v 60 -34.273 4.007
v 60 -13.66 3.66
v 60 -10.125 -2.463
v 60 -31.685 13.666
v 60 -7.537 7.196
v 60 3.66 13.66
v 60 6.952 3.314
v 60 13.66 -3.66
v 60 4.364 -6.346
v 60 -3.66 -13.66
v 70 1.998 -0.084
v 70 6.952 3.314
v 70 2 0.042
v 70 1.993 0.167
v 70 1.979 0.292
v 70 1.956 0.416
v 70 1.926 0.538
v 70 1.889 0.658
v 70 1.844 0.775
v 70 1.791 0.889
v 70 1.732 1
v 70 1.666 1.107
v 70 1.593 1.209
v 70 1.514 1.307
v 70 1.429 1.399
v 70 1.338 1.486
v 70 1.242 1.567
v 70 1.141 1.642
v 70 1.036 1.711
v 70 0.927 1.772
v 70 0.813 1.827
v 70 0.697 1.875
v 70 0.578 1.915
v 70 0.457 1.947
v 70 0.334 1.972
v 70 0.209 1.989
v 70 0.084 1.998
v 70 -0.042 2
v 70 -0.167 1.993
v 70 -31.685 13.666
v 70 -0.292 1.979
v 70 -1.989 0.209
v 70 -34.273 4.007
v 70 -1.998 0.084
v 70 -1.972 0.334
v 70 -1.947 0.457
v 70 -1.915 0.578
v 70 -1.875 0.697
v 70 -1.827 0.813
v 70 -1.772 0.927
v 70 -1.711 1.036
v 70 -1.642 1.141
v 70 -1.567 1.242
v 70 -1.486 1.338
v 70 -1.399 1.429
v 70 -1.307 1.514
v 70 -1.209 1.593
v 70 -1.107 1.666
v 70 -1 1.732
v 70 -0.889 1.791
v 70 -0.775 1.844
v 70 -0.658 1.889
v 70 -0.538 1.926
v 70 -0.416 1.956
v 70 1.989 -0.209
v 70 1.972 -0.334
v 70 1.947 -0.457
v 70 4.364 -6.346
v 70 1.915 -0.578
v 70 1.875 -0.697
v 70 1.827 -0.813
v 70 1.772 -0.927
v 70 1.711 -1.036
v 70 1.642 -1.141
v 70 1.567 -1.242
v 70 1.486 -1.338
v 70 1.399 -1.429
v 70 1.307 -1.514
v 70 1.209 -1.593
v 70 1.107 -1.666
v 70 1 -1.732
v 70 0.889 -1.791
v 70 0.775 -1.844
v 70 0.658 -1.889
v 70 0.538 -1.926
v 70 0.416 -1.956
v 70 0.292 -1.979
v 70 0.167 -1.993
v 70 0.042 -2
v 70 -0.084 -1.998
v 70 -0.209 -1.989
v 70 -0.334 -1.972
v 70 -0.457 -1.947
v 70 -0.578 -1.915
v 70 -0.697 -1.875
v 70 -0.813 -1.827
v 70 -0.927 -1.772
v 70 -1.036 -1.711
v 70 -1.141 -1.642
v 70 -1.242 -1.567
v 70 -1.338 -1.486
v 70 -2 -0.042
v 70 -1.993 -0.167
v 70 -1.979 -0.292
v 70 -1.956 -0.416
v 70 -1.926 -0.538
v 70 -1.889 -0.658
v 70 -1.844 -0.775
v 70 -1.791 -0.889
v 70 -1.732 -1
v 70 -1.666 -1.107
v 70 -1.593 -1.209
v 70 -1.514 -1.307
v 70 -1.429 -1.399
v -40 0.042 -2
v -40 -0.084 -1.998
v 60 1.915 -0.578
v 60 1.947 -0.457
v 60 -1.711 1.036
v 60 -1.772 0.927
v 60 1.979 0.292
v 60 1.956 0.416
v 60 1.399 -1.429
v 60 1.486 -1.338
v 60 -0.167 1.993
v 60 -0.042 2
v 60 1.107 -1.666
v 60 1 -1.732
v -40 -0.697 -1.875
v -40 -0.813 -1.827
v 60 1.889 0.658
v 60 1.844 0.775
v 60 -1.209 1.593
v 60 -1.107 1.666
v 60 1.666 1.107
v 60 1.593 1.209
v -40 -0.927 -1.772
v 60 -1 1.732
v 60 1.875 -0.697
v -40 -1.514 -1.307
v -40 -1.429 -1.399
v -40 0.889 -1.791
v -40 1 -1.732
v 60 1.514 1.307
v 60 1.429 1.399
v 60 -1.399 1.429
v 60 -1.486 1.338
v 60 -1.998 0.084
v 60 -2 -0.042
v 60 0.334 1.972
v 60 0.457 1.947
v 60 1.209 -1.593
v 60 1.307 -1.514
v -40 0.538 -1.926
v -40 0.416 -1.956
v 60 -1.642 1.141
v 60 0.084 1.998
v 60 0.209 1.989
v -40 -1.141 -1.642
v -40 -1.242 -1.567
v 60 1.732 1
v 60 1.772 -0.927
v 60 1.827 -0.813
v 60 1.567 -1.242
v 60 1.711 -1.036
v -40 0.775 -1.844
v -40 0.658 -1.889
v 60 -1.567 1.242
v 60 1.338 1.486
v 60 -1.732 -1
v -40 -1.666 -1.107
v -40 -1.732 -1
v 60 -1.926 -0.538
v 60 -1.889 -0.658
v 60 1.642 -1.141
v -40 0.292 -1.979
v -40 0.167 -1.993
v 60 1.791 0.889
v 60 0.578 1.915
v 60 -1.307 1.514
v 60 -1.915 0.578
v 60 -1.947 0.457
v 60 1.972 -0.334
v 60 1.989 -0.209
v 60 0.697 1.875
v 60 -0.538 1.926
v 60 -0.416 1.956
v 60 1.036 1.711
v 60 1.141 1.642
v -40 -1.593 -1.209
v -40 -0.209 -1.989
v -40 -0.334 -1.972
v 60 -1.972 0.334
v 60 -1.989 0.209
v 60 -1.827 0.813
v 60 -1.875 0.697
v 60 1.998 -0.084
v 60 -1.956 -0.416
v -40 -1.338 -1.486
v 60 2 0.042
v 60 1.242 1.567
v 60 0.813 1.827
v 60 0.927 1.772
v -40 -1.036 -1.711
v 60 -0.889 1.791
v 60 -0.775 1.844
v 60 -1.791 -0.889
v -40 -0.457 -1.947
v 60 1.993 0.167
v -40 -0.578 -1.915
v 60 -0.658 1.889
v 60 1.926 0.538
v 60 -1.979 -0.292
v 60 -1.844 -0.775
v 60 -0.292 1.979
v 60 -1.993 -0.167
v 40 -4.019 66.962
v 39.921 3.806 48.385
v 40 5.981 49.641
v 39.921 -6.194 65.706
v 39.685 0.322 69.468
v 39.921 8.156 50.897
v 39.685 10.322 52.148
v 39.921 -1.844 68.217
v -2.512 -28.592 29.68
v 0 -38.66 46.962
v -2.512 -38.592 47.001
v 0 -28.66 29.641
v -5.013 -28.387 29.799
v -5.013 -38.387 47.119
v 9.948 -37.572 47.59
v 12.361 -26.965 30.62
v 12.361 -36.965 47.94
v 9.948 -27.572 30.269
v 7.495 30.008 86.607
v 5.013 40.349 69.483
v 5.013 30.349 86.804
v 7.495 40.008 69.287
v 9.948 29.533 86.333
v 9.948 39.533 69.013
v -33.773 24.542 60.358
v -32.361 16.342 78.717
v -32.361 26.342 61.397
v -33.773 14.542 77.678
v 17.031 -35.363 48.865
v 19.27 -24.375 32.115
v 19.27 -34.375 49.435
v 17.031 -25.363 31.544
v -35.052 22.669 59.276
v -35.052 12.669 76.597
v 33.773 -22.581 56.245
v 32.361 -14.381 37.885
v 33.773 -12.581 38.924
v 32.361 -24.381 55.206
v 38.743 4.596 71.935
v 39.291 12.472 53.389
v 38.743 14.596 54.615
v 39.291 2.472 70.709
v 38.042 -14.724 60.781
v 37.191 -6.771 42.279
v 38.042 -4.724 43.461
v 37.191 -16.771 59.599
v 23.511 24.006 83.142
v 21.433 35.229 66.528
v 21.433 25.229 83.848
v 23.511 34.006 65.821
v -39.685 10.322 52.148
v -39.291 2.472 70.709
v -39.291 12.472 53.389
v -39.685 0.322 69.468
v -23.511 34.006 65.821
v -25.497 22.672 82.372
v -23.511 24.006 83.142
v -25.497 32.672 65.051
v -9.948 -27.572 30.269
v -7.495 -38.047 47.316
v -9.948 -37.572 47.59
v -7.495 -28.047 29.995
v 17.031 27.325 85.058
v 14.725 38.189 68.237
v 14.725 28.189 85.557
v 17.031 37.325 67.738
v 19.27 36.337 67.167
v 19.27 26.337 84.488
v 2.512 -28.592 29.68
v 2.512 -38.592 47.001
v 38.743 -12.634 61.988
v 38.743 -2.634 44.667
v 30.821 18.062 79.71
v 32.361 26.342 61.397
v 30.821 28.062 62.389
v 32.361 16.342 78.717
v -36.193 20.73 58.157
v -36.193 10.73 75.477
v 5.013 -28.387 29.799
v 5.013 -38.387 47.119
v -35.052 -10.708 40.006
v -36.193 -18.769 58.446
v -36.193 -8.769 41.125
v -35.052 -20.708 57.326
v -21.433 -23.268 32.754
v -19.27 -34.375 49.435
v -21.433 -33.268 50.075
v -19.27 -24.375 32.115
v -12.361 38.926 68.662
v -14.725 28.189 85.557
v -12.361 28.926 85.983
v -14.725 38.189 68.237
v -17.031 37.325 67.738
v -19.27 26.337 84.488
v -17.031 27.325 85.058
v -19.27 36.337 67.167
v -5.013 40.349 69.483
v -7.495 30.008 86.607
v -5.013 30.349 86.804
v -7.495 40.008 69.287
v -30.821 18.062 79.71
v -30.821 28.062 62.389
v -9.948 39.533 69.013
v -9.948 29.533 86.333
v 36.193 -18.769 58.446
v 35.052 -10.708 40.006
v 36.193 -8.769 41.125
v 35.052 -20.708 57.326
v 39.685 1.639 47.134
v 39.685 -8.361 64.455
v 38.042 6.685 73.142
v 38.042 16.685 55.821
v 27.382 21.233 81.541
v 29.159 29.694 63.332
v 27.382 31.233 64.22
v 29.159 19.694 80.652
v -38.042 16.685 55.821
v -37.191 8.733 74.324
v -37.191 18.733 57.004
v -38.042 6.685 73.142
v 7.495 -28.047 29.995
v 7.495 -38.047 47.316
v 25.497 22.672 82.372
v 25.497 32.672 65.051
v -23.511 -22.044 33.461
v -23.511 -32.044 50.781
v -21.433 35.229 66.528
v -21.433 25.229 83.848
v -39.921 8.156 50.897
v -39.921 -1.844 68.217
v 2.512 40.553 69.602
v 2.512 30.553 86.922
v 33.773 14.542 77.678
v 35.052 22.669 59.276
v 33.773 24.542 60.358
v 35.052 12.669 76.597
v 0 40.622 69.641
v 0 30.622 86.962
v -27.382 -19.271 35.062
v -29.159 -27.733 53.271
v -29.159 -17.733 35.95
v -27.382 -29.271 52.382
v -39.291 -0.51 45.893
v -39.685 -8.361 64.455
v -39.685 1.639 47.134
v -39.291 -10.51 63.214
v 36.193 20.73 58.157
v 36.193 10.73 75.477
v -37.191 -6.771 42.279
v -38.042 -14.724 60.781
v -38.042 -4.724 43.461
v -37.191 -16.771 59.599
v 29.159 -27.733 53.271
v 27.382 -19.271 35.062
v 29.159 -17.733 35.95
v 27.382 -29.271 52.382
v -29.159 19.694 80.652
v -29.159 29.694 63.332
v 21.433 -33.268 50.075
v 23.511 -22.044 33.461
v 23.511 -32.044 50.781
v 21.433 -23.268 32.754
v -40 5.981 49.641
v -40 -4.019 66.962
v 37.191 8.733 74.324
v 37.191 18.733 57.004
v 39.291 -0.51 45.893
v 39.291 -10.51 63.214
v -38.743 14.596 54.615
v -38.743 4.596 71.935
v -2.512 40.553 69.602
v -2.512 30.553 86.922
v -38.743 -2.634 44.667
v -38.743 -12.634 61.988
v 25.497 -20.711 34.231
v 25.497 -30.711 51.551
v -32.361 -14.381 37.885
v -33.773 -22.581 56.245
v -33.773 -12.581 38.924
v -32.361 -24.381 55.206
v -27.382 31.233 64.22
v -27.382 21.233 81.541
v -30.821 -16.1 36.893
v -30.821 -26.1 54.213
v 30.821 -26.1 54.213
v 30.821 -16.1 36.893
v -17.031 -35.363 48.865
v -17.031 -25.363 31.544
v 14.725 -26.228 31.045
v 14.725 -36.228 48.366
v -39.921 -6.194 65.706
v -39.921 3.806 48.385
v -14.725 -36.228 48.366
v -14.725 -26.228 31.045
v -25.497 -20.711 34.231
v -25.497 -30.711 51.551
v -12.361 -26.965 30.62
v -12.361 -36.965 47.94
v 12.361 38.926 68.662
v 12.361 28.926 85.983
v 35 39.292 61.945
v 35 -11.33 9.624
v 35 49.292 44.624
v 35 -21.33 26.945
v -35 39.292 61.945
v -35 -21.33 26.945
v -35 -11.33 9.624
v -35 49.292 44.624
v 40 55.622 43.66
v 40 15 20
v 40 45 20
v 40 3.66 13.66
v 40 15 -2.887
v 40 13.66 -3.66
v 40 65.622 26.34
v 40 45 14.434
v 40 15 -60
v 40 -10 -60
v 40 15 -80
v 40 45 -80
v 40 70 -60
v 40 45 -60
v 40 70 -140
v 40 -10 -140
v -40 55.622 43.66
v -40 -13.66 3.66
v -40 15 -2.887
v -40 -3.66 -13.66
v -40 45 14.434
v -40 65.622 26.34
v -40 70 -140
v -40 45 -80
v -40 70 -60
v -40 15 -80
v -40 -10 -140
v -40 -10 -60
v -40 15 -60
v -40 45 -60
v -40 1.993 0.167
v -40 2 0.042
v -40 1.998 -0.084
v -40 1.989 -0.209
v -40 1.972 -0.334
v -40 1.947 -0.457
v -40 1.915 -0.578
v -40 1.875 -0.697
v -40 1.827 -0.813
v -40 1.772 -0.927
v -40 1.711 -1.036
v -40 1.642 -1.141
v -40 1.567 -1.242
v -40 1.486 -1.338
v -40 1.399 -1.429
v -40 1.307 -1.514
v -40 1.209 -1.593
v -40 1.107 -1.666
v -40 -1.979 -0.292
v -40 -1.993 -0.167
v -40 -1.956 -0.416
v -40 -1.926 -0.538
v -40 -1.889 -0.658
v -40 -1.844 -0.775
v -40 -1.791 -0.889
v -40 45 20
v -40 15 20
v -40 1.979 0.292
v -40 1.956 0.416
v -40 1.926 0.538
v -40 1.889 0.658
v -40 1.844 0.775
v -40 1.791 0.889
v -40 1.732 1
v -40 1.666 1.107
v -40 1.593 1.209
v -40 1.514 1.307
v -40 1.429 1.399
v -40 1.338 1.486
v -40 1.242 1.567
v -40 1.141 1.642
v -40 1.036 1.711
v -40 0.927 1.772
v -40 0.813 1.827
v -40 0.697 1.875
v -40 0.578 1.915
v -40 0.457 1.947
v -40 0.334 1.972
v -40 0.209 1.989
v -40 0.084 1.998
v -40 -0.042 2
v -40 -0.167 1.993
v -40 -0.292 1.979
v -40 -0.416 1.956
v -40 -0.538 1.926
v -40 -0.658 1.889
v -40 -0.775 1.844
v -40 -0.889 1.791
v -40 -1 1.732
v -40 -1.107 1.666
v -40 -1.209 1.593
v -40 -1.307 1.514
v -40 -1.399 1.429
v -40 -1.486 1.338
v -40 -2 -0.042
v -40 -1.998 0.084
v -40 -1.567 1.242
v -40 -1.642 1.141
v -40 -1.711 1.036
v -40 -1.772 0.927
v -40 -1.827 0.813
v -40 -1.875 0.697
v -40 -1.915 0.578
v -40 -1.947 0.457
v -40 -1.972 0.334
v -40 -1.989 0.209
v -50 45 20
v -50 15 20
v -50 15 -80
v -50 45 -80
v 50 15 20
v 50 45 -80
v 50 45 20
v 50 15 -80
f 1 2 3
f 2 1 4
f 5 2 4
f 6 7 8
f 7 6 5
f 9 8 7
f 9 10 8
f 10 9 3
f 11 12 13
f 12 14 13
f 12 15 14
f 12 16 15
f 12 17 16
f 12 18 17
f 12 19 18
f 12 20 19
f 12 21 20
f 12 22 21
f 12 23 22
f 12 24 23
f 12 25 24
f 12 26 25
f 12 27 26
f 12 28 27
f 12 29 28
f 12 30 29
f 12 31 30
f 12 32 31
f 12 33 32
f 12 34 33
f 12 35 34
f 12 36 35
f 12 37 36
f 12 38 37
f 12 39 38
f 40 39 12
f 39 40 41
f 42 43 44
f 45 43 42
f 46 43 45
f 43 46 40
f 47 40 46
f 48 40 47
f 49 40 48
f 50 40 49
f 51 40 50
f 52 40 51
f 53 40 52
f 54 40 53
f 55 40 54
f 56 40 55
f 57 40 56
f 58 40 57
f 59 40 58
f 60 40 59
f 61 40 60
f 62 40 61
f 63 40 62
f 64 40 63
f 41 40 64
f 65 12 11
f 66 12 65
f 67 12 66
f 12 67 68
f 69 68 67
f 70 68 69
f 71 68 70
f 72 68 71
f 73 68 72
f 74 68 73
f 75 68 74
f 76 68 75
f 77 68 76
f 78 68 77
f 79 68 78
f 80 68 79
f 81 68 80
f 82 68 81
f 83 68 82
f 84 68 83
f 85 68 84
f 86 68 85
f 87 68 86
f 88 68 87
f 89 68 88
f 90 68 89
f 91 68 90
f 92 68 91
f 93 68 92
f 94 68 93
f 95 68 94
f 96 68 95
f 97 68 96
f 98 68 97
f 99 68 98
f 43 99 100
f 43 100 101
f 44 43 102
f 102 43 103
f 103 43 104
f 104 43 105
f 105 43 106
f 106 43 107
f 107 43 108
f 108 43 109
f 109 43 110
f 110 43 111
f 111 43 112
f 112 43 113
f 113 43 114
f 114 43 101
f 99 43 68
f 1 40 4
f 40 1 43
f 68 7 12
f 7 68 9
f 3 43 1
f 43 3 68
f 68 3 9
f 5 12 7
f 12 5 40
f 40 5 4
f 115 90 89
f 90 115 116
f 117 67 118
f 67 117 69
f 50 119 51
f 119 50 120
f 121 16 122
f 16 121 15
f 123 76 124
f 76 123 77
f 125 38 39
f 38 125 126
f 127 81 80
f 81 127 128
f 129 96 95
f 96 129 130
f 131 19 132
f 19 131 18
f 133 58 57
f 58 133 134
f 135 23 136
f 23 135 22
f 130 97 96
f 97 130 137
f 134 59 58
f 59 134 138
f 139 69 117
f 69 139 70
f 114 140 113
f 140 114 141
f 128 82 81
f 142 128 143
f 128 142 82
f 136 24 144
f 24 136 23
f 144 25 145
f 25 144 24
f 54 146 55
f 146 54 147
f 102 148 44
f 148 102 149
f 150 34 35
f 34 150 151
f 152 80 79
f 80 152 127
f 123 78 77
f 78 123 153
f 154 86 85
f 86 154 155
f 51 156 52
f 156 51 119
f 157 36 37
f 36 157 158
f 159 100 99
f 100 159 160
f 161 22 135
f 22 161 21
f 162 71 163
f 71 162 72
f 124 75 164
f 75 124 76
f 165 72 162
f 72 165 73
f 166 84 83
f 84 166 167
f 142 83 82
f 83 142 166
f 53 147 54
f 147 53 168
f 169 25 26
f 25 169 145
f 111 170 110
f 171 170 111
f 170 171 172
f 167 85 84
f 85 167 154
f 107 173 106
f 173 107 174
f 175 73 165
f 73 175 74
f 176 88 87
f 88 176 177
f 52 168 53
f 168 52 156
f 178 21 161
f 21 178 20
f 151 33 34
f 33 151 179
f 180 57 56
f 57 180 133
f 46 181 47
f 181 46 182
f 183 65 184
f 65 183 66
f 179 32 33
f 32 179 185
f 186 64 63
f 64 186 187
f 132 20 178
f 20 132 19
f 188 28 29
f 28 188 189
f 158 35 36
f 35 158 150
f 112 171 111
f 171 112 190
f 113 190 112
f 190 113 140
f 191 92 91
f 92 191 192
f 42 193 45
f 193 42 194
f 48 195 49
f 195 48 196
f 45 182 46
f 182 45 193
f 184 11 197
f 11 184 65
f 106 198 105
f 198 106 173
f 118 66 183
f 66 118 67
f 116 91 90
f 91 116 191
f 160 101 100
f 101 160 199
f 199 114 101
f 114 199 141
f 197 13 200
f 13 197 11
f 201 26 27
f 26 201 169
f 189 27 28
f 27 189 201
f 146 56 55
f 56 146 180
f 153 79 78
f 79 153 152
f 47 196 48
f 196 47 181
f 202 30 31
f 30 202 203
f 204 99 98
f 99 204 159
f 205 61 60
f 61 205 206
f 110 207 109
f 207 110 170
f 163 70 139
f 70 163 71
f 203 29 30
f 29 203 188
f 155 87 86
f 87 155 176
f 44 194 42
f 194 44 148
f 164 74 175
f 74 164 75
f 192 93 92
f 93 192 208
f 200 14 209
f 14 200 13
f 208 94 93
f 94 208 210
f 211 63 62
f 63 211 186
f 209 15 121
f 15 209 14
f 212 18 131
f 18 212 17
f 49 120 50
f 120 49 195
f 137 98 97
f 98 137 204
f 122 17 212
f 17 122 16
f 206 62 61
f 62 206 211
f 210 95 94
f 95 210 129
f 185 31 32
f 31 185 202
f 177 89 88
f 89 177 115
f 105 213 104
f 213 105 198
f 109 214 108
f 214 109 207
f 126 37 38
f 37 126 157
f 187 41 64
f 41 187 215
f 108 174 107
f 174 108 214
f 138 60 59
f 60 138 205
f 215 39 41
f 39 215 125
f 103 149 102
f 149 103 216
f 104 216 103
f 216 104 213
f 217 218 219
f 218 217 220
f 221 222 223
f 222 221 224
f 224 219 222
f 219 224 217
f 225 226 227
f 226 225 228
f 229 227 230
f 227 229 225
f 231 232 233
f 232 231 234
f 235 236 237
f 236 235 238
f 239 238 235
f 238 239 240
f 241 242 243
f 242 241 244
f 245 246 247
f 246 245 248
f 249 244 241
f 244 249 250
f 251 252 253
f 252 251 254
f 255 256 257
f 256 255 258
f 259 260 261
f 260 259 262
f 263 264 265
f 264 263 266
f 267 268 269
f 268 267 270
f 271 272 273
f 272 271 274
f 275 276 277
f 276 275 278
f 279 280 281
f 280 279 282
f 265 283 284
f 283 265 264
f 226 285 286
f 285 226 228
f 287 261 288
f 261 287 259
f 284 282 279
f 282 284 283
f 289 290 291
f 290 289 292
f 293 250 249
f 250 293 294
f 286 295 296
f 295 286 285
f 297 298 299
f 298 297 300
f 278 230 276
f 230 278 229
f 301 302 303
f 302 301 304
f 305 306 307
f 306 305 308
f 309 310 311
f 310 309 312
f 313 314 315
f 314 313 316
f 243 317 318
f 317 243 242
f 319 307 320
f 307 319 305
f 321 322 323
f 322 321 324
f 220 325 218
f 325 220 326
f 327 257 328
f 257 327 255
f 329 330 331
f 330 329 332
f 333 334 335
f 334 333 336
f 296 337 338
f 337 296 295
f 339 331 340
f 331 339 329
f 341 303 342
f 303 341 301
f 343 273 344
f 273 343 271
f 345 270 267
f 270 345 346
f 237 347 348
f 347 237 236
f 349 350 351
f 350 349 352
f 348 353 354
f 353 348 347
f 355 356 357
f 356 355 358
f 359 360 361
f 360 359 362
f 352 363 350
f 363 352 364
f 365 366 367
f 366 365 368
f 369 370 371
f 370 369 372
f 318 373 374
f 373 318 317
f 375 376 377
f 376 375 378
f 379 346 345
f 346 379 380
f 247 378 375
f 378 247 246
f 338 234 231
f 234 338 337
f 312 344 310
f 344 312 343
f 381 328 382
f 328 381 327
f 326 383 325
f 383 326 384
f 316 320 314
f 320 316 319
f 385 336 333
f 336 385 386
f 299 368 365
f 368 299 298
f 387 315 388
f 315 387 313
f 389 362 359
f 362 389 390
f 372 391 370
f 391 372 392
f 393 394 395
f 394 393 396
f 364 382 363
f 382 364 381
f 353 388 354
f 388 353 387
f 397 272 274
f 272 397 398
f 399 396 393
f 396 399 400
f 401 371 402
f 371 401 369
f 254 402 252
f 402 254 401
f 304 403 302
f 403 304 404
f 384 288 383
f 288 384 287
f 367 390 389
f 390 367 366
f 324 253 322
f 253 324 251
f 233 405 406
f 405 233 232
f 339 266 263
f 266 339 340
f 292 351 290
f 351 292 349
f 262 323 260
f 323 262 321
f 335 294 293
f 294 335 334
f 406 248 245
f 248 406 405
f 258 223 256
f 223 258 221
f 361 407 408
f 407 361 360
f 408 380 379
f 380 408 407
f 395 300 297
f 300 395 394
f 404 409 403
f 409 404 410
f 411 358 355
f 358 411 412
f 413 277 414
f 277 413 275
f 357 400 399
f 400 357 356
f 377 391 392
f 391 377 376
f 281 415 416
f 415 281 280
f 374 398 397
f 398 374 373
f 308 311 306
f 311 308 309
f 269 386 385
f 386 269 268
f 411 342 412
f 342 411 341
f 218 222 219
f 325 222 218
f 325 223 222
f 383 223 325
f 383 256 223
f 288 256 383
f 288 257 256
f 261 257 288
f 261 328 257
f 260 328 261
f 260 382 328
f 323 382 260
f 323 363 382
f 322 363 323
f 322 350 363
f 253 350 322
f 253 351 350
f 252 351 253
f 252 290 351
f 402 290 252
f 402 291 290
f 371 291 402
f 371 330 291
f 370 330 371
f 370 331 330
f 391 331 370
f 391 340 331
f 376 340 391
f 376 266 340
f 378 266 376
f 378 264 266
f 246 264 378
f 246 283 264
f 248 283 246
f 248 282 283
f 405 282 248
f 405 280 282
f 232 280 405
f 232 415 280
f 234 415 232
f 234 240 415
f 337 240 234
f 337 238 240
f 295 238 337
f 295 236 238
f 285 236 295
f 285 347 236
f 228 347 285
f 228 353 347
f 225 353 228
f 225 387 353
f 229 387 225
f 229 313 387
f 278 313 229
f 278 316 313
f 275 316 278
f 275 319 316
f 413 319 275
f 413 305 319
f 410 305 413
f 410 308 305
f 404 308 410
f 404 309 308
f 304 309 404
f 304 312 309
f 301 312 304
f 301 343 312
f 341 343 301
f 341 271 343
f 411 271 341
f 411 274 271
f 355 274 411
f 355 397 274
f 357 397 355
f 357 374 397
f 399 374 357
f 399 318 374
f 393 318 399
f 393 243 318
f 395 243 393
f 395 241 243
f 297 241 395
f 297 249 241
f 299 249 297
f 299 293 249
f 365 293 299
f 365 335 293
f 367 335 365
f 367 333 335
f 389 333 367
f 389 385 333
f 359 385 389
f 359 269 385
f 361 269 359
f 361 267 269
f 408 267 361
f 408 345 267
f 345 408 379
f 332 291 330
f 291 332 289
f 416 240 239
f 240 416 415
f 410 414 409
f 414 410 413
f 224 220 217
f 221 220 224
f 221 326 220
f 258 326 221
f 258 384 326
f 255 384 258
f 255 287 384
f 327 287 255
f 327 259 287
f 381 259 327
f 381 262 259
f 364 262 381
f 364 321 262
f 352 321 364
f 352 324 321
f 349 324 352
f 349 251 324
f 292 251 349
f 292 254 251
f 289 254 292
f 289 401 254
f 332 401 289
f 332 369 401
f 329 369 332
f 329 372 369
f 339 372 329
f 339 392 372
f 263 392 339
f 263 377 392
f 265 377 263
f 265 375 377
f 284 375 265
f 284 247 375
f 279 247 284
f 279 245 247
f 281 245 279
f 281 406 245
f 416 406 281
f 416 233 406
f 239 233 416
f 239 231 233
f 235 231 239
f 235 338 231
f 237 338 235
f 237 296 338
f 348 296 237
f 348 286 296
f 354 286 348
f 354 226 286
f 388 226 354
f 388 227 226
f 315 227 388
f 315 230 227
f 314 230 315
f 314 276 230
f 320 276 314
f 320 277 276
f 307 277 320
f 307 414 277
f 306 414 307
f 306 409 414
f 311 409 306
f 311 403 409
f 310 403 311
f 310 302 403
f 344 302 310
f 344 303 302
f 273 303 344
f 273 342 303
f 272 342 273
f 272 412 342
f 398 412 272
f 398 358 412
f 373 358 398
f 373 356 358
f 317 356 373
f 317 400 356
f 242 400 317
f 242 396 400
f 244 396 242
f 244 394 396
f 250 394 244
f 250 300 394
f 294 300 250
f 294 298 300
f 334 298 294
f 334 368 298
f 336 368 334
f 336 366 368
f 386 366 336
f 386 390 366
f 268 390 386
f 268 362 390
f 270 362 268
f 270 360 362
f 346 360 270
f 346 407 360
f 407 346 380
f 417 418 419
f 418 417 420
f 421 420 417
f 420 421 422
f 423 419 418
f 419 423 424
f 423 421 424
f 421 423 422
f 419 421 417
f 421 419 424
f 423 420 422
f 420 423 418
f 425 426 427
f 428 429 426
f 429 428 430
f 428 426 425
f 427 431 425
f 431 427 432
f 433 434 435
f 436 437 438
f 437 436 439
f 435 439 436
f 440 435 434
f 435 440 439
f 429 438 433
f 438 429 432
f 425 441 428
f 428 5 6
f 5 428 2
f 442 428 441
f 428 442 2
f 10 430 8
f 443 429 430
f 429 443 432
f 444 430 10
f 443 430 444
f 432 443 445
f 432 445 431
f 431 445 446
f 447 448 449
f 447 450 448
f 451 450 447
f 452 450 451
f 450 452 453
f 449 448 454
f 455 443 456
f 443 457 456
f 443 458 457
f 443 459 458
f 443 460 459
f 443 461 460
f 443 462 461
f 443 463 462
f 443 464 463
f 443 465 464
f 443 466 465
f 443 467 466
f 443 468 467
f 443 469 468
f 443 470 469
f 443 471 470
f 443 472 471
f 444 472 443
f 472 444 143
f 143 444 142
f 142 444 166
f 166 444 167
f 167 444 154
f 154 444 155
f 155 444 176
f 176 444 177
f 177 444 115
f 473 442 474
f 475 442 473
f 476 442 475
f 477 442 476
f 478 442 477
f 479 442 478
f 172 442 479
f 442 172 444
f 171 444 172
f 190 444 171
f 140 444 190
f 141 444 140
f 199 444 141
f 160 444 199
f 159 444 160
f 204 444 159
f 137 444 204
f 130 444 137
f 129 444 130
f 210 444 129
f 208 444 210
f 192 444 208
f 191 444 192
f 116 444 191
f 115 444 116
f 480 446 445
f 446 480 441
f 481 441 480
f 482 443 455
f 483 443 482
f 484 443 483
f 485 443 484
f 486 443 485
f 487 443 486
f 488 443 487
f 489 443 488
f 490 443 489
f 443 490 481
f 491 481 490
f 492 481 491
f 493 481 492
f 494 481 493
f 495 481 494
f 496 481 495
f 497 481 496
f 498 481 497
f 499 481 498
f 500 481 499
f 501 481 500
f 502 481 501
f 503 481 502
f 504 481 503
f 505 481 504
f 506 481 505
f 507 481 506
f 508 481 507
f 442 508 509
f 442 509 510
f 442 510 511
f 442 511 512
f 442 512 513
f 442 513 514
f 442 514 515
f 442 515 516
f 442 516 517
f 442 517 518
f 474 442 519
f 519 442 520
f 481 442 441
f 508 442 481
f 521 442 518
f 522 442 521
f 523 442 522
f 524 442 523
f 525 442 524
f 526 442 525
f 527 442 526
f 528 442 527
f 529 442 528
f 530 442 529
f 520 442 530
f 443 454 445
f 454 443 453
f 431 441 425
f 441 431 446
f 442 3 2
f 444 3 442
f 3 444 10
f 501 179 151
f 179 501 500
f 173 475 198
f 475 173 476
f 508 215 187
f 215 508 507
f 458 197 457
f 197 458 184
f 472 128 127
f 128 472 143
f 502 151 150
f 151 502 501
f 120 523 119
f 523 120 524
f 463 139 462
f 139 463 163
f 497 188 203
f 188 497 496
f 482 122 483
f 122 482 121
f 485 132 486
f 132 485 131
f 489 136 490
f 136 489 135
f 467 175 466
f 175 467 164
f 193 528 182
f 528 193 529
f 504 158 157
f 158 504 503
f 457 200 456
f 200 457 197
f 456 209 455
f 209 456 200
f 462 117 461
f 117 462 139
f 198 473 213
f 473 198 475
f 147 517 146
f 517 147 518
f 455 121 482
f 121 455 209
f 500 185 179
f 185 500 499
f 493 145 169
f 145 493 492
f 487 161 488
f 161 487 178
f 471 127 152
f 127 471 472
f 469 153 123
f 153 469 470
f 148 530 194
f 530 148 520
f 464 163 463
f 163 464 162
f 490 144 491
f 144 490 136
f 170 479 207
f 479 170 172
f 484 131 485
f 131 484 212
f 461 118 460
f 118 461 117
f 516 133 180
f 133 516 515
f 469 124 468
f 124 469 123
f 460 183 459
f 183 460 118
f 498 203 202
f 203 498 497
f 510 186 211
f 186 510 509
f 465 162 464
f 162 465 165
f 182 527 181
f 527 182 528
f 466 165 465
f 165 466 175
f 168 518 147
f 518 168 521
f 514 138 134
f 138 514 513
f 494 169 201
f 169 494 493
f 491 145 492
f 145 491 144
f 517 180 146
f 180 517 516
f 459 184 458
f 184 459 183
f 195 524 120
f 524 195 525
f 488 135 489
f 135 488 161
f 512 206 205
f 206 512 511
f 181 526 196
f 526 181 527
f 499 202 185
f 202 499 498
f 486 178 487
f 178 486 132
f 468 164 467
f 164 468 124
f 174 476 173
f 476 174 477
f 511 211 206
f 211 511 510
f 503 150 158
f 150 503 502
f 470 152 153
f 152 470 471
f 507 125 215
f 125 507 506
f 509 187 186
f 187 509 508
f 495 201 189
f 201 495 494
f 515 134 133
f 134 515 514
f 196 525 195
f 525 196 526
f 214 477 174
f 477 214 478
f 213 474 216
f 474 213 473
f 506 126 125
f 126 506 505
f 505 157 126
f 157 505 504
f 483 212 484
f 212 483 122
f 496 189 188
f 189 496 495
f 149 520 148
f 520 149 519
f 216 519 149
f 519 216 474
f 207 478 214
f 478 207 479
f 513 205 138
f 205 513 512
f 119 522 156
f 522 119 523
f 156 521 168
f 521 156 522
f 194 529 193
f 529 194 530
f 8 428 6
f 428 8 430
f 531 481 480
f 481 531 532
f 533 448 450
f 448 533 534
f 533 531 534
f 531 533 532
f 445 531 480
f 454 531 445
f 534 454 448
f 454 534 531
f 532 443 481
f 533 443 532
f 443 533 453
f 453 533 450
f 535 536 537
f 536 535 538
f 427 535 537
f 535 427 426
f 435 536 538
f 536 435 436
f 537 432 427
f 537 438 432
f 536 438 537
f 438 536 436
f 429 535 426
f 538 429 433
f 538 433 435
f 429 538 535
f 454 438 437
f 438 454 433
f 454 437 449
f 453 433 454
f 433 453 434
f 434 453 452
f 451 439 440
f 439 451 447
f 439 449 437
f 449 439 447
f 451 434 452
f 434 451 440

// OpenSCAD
$fn=100;
 
rotate([ 30+$t*100,0,0]){
//摄像头
translate([0,30,40]){

 


//斜角连接器
difference(){
translate([65,-40,-30])
rotate([45,0,0])
cube([10,10,40],center=true);
rotate([0,90,0])
translate([40,-30,-0])
cylinder(200,2,2,center=true);
}
//遮盖
translate([10,10,30])
%cube([140,120,6],center=true);
translate([0,-45,3])
%cube([120,6,60],center=true);

translate([10,70,3])
%cube([140,6,60],center=true);
}

 }





rotate([30,0,0]){
//摄像头
translate([0,30,40]){

color("DimGray")
cylinder(20,40,40);
//风扇
color("Black")
translate([0,0,-16])
cube([70,70,20],center=true);}

//底座
difference(){
translate([0,30,0])
cube([80,80,20],center=true);
translate([0,0,0]){
rotate([0,90,0])
cylinder(200,2,2,center=true);
}
}
difference(){
color("DodgerBlue")
translate([50,0,0])
cube([20,20,20],center=true);
translate([0,0,0]){
rotate([0,90,0])
cylinder(200,2,2,center=true);
}
}
}

//固定底板
translate([0,30,-100])
cube([80,80,80],center=true);
//底板连接器
difference(){
translate([-45,30,-30]) 
cube([10,30,100],center=true); 
rotate([0,90,0])
cylinder(200,2,2,center=true);
}

difference(){
translate([45,30,-30]) 
cube([10,30,100],center=true);
rotate([0,90,0])
cylinder(200,2,2,center=true);

}
